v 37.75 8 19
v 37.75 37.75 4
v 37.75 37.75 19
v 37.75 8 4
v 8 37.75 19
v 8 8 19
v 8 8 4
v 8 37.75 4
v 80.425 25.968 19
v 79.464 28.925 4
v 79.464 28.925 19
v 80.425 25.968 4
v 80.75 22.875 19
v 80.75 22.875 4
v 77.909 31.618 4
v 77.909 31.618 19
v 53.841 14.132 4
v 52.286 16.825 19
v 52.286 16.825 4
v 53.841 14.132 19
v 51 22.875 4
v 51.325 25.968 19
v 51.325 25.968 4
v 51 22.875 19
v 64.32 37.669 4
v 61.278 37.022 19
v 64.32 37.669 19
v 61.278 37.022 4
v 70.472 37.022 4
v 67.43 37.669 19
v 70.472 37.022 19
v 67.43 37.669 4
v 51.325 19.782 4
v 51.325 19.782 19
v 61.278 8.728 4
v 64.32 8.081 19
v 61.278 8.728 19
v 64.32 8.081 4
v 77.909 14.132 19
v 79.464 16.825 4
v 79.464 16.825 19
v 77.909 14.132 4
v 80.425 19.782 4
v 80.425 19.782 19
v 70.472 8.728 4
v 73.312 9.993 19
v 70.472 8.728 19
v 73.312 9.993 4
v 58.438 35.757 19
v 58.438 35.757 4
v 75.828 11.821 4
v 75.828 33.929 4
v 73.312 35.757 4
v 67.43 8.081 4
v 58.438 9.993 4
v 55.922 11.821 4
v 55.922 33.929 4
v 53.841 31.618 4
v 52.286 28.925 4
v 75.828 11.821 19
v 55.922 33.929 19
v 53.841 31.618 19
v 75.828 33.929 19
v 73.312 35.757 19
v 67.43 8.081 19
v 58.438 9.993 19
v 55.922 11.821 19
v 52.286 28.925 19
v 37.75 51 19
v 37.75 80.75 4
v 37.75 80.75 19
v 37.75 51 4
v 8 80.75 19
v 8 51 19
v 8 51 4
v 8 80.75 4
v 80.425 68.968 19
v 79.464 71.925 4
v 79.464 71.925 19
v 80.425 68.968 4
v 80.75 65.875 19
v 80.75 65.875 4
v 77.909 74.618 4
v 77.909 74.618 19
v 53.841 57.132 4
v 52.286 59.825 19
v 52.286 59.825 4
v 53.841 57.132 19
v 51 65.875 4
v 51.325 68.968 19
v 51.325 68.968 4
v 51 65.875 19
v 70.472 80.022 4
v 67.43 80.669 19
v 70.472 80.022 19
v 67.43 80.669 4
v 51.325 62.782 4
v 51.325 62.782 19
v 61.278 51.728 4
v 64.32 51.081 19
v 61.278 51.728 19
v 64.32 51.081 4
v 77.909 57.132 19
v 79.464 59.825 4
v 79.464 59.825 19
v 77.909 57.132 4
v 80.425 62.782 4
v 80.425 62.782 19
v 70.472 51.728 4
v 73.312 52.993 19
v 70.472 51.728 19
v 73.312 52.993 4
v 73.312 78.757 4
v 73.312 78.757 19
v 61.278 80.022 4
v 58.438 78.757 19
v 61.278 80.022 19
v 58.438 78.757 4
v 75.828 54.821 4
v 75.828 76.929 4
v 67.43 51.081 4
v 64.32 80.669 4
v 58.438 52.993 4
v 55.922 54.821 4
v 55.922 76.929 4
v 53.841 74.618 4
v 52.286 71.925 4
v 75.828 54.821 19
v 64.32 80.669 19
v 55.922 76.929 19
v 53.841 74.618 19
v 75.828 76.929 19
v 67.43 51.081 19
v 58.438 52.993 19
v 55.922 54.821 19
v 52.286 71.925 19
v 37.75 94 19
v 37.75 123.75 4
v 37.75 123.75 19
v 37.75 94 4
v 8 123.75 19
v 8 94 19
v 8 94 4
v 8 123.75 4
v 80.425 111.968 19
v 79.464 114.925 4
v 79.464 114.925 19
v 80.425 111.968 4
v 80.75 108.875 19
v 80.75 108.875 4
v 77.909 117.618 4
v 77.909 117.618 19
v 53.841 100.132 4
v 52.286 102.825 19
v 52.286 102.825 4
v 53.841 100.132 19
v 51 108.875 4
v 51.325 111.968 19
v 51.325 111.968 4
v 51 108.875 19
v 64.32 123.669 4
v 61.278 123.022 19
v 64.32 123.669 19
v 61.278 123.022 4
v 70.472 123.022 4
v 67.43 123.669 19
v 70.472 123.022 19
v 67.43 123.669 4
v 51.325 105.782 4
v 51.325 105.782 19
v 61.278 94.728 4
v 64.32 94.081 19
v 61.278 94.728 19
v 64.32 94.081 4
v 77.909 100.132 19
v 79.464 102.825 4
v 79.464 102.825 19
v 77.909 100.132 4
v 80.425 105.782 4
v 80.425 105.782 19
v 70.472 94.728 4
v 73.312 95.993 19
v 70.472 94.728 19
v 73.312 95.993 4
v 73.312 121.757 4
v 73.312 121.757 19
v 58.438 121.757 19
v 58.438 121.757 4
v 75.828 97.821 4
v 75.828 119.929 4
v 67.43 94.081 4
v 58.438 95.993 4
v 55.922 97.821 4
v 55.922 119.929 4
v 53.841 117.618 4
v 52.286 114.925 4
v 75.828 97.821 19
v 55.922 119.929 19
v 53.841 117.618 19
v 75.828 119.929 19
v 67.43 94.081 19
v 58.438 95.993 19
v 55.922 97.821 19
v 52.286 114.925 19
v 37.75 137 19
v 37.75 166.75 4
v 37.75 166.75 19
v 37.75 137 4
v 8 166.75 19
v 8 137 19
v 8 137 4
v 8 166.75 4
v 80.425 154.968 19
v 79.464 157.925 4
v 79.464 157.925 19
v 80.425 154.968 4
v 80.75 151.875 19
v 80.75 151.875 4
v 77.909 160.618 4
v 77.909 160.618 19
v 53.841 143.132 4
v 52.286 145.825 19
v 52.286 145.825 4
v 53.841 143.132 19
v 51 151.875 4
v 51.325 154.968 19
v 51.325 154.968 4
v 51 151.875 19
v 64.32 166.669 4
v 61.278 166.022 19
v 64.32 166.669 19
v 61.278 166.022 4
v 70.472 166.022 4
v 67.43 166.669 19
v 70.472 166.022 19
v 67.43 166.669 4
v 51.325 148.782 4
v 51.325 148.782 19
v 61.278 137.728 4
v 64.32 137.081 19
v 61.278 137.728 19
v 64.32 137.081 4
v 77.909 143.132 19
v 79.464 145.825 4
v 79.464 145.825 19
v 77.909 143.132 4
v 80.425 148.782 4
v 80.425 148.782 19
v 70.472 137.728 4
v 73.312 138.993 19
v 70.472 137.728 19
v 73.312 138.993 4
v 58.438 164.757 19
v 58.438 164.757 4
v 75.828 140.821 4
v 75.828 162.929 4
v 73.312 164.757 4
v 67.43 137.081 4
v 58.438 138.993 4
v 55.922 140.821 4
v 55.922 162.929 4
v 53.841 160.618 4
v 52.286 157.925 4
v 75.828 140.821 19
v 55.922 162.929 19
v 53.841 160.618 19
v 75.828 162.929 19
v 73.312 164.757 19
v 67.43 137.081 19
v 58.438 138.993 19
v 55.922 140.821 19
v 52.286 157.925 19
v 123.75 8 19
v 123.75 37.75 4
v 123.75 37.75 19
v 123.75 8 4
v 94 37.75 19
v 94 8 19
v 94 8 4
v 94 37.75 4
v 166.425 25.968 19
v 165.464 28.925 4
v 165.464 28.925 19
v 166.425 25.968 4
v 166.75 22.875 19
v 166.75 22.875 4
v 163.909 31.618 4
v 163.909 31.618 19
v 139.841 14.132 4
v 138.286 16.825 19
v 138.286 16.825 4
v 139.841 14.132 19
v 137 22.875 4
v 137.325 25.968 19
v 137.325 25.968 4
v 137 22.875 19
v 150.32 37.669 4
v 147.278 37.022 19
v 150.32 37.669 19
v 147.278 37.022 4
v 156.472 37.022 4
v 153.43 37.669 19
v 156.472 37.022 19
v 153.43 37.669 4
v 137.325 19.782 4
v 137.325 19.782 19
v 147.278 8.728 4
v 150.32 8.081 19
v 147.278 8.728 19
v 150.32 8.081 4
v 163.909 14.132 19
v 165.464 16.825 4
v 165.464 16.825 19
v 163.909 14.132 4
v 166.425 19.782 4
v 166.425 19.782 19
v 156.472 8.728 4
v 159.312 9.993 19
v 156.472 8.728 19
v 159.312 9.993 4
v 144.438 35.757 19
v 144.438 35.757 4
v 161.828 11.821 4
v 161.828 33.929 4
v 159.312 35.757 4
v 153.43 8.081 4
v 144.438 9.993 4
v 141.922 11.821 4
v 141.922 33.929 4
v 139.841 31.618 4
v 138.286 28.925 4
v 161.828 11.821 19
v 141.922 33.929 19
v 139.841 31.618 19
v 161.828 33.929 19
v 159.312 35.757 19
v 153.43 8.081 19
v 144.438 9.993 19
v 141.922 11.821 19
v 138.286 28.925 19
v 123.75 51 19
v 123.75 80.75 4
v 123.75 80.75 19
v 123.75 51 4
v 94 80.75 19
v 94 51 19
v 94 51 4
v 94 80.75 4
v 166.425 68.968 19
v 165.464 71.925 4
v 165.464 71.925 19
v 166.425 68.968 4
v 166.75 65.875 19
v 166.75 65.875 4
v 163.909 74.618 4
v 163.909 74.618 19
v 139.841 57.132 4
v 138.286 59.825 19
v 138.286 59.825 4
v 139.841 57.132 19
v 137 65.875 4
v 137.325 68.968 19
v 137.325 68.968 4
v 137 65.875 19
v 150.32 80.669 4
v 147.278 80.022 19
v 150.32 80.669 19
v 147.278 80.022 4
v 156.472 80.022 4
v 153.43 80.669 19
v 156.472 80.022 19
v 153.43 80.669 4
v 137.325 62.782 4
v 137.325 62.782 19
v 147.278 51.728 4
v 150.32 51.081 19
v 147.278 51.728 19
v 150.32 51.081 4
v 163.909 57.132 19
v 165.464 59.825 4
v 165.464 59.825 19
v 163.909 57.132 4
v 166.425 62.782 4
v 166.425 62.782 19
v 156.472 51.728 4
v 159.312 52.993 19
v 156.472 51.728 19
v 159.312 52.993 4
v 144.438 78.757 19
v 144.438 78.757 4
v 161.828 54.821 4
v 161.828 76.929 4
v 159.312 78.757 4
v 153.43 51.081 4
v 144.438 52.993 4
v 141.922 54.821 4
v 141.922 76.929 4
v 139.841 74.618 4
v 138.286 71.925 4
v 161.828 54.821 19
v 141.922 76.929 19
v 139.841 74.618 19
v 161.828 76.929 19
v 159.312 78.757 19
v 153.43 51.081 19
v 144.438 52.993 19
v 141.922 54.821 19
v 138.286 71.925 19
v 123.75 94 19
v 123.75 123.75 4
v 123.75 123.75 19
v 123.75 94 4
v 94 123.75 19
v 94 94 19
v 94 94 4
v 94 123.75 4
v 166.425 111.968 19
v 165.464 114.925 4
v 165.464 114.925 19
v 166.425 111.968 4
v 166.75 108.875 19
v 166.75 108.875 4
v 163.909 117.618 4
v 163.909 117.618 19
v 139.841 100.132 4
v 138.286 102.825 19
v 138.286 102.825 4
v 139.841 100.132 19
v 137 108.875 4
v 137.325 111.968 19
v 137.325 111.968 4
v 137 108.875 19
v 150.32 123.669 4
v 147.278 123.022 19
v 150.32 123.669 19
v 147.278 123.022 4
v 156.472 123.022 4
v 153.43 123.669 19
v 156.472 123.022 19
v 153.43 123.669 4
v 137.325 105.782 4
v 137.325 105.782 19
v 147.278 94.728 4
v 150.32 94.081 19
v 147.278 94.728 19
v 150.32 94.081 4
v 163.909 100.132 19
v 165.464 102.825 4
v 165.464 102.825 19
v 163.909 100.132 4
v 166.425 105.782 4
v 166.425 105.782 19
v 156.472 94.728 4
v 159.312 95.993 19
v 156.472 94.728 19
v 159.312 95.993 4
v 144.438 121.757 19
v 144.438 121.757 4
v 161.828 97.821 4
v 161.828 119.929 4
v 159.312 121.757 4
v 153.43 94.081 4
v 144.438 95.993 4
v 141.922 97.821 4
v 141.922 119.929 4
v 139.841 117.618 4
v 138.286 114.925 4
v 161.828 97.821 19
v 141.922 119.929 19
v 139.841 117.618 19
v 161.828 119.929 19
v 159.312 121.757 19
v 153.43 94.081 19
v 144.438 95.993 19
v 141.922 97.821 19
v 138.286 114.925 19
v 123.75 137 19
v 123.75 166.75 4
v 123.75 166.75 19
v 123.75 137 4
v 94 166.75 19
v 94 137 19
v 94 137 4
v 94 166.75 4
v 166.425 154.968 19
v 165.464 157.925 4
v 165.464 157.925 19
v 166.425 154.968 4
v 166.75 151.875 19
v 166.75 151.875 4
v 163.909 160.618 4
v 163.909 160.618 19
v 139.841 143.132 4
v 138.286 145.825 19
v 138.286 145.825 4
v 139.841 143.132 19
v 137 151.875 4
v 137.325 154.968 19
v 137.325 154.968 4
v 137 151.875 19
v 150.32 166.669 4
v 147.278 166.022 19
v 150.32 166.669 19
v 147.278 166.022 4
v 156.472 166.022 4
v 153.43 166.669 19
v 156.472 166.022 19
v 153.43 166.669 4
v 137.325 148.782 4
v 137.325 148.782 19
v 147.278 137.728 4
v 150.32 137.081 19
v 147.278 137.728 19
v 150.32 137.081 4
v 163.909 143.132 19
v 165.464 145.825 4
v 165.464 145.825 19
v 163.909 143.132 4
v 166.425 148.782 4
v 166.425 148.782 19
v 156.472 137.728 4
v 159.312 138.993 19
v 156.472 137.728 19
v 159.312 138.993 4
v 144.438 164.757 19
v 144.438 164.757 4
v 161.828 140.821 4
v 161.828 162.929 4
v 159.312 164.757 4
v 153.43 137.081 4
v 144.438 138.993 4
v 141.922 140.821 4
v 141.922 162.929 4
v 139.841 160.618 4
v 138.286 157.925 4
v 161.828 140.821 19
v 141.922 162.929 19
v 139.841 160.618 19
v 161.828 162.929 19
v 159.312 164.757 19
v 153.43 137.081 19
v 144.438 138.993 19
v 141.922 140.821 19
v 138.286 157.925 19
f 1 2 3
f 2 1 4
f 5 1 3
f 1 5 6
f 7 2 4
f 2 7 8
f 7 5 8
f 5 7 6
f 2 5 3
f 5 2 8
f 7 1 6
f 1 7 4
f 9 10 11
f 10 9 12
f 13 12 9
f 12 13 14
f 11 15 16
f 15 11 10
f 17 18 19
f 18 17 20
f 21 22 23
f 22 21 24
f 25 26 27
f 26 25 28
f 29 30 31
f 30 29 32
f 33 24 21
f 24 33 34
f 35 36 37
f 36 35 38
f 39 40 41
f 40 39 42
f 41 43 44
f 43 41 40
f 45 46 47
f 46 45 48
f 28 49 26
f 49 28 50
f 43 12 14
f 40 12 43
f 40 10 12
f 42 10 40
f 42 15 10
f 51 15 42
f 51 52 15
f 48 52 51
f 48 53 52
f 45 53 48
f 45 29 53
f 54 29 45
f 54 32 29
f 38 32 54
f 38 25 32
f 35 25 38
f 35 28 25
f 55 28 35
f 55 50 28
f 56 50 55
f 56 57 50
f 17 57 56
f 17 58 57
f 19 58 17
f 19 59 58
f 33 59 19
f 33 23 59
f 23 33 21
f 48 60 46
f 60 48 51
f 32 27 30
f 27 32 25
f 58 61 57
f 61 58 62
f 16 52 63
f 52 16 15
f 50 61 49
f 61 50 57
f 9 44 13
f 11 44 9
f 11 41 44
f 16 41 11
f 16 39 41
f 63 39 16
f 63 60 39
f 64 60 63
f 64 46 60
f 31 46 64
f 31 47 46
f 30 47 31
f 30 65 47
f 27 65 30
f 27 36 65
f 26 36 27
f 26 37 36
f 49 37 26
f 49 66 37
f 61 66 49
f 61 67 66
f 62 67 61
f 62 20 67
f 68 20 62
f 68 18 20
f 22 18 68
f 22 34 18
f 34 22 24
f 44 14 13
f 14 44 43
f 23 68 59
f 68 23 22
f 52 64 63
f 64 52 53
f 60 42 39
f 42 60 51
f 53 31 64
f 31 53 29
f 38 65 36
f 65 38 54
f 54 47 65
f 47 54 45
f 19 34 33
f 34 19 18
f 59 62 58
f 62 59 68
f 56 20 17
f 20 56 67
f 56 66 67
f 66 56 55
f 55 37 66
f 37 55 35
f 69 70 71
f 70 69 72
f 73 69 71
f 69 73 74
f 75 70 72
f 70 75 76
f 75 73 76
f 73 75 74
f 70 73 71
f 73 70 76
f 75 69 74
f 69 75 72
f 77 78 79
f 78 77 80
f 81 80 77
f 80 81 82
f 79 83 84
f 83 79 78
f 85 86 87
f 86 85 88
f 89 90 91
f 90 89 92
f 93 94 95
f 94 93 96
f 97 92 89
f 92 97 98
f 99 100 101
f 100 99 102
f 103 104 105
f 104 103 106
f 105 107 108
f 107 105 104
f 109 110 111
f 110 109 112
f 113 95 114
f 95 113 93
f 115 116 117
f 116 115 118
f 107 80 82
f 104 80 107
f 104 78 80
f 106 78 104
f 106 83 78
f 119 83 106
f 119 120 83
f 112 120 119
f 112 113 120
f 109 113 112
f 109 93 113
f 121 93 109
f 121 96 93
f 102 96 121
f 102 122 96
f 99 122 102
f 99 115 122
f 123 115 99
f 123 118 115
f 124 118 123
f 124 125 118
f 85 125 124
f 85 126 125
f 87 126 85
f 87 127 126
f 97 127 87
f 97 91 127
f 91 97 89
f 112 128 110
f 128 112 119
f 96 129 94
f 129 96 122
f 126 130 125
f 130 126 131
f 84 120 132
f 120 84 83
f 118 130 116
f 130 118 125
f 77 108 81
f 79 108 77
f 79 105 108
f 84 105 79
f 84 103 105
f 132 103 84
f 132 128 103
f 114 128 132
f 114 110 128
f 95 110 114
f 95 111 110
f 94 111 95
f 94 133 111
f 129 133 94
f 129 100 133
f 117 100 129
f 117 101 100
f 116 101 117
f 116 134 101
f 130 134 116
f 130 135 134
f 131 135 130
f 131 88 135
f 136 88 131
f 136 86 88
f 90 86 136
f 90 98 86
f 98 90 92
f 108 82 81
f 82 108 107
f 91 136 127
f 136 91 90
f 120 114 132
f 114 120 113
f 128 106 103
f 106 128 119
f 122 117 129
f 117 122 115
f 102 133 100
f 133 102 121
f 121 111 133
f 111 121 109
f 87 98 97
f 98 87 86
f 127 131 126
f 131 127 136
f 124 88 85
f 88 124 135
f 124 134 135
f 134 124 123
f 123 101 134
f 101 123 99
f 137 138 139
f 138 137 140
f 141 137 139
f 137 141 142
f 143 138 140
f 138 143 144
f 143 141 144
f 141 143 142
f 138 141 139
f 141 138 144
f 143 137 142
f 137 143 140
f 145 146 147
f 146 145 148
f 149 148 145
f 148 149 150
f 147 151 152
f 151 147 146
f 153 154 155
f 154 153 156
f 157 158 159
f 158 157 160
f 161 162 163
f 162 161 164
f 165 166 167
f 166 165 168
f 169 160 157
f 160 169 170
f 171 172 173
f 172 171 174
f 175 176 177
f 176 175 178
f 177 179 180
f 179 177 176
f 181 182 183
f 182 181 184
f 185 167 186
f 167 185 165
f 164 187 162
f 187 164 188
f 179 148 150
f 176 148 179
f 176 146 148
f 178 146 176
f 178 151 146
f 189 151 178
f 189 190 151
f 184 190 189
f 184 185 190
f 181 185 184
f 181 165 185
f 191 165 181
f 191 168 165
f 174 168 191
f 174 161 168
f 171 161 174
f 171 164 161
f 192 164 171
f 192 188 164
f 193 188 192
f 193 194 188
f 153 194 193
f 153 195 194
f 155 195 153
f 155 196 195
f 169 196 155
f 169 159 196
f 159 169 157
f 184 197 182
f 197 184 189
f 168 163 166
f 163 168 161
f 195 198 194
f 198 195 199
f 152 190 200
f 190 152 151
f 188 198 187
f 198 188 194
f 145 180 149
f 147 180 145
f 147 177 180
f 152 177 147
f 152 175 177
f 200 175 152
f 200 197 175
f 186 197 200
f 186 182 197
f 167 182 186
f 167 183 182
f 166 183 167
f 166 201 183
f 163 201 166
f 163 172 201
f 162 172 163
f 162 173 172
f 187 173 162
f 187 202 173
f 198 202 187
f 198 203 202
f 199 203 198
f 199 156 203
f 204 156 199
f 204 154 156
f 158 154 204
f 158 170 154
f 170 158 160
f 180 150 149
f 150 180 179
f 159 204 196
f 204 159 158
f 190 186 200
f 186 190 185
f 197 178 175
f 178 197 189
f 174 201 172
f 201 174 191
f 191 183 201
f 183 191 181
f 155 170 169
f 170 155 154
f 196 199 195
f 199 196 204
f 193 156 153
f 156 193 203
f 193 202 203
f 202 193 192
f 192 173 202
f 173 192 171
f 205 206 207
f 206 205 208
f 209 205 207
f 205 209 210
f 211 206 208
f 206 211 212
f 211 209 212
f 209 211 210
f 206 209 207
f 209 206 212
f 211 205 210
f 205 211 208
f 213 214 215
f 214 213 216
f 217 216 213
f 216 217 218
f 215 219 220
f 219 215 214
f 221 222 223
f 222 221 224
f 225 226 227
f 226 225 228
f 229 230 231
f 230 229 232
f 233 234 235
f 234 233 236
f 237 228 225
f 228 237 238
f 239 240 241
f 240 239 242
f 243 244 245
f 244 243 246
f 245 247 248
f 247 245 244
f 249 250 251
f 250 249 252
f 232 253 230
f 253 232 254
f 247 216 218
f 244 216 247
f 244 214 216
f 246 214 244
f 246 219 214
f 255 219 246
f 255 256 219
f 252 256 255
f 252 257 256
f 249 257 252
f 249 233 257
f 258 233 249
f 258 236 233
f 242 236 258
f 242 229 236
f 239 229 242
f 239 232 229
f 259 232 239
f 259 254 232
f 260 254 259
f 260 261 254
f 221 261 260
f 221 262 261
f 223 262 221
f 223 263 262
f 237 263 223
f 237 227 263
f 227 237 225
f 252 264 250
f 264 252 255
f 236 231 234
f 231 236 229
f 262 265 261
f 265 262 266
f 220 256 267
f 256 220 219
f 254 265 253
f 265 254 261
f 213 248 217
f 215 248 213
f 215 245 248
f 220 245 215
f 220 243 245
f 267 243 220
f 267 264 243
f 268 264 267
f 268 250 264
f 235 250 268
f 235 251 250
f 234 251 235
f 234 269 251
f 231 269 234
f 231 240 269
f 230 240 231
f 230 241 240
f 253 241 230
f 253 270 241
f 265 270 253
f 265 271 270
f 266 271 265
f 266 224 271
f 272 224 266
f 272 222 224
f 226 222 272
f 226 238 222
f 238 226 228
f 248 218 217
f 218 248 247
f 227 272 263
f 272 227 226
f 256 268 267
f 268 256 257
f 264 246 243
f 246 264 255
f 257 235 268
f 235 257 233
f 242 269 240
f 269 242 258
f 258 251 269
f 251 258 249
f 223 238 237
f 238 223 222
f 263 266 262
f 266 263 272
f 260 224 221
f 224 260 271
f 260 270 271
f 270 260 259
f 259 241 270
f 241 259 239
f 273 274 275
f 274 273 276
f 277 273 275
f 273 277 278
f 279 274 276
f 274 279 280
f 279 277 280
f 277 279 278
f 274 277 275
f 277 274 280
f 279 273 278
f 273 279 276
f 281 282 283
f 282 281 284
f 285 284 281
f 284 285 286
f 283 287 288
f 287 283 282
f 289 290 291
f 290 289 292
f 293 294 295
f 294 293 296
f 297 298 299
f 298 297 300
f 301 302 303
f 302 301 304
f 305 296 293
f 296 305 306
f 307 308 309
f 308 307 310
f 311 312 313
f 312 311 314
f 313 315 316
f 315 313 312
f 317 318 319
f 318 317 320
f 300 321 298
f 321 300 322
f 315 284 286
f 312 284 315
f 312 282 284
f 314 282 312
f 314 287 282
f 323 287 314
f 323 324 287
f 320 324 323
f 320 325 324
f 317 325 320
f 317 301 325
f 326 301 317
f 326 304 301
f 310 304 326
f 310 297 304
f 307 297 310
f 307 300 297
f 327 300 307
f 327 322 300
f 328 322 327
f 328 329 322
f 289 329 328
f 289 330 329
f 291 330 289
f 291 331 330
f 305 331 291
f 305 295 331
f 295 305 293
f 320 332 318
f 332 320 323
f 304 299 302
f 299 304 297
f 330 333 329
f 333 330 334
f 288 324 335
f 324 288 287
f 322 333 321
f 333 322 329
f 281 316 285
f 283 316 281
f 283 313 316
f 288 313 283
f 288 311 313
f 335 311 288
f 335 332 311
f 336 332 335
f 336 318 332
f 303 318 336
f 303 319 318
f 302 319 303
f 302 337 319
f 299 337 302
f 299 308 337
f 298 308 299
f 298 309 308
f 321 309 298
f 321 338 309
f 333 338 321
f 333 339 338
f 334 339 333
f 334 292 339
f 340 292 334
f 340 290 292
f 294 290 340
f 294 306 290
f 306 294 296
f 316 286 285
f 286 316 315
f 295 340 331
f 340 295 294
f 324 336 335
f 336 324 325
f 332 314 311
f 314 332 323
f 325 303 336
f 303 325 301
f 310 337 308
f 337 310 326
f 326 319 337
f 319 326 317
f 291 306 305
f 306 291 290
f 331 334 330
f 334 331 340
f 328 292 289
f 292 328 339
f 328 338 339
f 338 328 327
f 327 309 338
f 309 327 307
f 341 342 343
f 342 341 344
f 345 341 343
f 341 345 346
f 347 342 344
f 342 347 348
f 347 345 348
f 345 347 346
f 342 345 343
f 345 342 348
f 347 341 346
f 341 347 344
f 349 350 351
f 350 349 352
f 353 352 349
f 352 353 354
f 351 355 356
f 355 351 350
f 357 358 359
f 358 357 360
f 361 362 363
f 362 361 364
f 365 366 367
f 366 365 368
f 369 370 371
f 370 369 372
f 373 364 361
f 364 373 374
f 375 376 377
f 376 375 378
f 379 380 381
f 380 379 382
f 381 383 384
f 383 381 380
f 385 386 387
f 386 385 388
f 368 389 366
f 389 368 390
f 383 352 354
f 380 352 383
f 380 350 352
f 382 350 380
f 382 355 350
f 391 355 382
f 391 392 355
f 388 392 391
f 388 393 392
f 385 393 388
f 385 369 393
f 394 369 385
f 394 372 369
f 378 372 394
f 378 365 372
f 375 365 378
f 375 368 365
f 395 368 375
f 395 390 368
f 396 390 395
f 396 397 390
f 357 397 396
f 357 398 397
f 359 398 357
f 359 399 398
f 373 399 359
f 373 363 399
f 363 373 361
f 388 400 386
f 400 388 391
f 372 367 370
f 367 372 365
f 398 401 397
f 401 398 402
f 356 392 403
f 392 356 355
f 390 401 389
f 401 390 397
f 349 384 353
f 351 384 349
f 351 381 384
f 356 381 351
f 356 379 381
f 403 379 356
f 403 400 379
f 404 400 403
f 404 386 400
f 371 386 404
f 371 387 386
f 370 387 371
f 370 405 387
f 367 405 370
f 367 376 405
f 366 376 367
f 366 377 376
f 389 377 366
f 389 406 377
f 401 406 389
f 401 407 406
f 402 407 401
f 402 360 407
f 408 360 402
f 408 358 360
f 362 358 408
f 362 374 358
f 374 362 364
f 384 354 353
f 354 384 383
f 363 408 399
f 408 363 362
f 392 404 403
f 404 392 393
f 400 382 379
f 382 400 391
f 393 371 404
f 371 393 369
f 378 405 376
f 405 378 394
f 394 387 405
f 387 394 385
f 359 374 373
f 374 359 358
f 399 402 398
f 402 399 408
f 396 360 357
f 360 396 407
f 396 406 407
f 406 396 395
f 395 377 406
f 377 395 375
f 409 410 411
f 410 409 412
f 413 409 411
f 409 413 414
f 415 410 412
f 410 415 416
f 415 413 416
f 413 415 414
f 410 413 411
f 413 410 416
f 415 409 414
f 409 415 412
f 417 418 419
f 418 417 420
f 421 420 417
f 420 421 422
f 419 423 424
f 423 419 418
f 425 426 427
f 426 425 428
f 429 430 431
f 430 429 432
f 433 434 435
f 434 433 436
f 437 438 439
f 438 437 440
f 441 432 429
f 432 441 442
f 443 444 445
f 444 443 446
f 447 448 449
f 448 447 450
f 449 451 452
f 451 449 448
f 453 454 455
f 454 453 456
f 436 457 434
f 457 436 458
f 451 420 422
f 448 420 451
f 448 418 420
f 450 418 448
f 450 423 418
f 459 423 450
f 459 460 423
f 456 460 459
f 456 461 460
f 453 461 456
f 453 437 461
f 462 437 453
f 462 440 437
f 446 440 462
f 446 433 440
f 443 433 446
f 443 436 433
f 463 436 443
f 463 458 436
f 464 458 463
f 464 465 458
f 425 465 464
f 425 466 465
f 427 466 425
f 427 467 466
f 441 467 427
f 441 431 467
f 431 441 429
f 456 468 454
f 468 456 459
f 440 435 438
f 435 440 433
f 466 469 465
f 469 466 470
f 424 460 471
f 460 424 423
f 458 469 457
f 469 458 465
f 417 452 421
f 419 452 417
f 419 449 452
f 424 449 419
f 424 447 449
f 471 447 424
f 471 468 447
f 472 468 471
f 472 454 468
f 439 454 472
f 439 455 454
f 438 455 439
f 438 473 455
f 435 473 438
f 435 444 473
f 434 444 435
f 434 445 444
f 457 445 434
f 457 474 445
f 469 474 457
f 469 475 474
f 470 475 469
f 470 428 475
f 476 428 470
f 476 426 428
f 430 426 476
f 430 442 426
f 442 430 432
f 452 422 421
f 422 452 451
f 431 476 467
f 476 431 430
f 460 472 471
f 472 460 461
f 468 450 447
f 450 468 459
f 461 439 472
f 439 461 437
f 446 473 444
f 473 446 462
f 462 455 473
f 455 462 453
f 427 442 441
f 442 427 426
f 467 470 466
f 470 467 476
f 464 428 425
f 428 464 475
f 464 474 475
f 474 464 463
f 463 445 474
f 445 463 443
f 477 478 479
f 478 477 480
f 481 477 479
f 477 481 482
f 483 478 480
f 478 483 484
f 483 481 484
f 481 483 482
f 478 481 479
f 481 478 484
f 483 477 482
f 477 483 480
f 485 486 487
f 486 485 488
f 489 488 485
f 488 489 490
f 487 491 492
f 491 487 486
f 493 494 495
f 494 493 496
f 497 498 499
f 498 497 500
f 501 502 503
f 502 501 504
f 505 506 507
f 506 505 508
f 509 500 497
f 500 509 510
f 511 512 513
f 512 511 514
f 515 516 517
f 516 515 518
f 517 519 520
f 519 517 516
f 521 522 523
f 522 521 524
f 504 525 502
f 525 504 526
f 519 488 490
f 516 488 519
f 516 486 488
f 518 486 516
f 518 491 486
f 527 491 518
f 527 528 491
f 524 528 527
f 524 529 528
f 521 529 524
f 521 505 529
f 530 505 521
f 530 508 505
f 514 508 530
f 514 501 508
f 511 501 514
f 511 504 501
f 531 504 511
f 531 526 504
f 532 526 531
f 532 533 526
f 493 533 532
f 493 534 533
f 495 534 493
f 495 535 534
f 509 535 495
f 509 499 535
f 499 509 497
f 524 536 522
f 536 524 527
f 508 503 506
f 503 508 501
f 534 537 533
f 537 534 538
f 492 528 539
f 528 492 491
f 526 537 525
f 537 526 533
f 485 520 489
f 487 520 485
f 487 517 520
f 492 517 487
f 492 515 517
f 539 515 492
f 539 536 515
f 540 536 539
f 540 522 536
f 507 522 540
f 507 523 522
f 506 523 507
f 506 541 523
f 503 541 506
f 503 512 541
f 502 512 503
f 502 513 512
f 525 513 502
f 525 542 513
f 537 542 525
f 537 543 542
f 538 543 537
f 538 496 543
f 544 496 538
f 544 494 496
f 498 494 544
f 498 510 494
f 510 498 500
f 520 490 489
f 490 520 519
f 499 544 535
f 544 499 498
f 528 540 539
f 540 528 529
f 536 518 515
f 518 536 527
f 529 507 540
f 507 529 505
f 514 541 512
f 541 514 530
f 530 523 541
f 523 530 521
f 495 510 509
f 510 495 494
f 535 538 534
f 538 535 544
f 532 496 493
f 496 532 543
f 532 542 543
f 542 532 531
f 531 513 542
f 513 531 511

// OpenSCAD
/**
 * 
 * Adapted toys - juguetes adaptados
 * 
 * Puzzle 2
 * 
 * Created by DViejo
 * 05/Nov/2014
 * 
 * TODO: include a handler for object pieces
 */

height = 8;
boardSide = 180;

objectHoleSide = 35;
objectGap= 8;

objectSide = objectHoleSide*0.85;
objectHeight = 15;

module puzzleBase()
{
  cube([boardSide, boardSide, height]);
}

module puzzleHoles()
{
  for(i = [0:3])
    for(j = [0:3])
      translate([objectGap+(objectGap+objectHoleSide)*i*2-(objectGap+objectHoleSide)*j, objectGap+(objectGap+objectHoleSide)*j, height/2])
      {
	piece1(objectHoleSide);
	translate([objectGap+objectHoleSide, 0, 0]) piece2(objectHoleSide);
      }
}

module puzzle2Board()
{
  difference()
  {
    puzzleBase();
    puzzleHoles();
  }
}

module piece1(side = objectSide)
{
  cube([side, side, objectHeight]);
}

module piece2(side = objectSide)
{
  translate([side/2, side/2, 0])
    cylinder(r=side/2, h=objectHeight);
}

module pieceSet()
{
  for(i = [0:1])
    for(j = [0:3])
      translate([objectGap+(objectGap+objectHoleSide)*i*2, objectGap+(objectGap+objectHoleSide)*j, height/2])
      {
	piece1();
	translate([objectGap+objectHoleSide, 0, 0]) piece2();
      }
}


pieceSet();
